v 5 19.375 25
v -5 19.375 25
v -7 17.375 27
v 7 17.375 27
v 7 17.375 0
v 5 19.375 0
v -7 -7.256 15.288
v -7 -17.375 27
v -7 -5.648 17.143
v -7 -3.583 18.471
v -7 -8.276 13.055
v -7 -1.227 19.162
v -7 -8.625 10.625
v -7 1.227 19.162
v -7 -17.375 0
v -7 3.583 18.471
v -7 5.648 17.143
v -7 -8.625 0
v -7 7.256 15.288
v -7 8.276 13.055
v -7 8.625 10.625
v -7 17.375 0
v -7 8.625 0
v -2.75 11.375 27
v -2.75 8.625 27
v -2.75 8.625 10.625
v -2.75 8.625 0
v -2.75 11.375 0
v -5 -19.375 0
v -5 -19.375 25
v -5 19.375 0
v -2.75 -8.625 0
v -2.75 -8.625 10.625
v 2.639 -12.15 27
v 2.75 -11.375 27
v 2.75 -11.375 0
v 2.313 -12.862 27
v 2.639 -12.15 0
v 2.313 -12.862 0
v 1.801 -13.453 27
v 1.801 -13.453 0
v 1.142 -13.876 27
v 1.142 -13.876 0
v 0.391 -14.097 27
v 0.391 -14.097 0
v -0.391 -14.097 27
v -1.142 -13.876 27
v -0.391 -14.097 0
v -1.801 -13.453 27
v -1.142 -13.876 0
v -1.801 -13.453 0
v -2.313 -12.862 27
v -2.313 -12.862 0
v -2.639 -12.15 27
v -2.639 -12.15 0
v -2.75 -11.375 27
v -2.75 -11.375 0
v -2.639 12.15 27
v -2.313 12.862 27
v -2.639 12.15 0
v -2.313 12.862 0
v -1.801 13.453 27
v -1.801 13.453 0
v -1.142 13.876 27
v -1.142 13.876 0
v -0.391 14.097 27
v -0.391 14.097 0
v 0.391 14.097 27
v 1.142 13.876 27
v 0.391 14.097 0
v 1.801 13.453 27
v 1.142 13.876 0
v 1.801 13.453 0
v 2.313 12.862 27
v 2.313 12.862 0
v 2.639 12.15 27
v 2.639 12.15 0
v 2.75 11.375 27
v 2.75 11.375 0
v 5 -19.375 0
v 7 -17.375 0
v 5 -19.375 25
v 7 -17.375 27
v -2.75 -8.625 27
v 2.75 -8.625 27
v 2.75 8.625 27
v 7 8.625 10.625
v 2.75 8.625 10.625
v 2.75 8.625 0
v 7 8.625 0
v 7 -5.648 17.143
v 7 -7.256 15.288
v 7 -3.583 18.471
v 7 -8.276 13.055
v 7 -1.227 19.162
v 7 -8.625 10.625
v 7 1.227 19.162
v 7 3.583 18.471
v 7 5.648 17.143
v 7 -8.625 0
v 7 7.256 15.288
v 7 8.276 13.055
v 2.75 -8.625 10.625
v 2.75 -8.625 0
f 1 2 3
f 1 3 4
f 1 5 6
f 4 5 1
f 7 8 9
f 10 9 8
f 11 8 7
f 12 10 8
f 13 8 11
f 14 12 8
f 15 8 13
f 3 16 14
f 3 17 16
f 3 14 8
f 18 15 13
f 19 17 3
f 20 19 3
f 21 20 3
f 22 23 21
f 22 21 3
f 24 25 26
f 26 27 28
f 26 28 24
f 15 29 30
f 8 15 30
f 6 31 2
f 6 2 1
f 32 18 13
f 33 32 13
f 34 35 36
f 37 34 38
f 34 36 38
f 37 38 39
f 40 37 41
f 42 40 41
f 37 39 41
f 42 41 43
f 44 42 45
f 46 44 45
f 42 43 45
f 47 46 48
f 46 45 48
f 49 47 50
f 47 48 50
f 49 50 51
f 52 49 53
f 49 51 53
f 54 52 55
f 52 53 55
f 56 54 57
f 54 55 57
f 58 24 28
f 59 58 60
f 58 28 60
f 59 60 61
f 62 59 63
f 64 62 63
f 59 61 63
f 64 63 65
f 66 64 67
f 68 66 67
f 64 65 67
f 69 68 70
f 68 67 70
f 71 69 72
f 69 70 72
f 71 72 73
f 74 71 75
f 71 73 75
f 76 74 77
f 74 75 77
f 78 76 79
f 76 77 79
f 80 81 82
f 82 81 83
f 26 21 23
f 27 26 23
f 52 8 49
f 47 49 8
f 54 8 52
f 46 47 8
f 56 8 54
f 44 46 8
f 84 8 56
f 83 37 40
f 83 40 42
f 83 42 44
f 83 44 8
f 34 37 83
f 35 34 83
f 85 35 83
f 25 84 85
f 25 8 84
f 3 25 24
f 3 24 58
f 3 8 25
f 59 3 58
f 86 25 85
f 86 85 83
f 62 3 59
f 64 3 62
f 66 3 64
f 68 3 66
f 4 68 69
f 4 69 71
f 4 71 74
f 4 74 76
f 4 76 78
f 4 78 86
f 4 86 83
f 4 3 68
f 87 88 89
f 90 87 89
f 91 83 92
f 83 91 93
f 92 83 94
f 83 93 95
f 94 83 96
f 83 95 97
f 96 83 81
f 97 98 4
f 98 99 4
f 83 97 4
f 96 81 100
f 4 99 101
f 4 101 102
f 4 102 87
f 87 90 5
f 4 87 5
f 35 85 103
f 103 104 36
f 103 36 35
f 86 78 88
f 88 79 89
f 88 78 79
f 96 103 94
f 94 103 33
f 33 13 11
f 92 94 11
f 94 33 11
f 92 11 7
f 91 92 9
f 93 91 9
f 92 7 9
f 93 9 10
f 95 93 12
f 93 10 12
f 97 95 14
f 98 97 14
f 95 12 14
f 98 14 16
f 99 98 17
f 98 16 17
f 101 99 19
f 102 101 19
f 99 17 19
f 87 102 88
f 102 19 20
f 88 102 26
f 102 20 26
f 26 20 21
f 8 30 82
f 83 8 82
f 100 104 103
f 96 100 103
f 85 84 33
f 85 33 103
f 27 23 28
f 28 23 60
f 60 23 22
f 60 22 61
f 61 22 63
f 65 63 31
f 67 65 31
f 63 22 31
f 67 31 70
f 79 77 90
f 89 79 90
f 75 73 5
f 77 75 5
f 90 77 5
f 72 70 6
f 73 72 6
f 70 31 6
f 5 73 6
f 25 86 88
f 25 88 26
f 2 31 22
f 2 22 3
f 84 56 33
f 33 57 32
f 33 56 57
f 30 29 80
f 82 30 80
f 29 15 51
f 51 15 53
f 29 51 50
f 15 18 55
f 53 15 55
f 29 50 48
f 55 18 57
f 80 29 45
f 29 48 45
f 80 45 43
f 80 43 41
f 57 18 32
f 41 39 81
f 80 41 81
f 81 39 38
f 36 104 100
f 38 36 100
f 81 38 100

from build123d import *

# Parameters (mm, degrees)
SKETCH1_W           = 14
SKETCH1_H           = 38.75
BOSS_EXTRUDE1_DEPTH = 27
SKETCH2_R           = 8.625
CUT_EXTRUDE1_DEPTH  = 15
CHAMFER1_SIZE       = 2
CHAMFER2_SIZE       = 2


with BuildPart() as part:
    # Sketch1 → Boss-Extrude1 (new body)
    with BuildSketch(Plane.XY):
        Rectangle(SKETCH1_W, SKETCH1_H)
        with BuildLine():
            ThreePointArc((2.75, -11.375), (0, -14.125), (-2.75, -11.375))
            Line((-2.75, -11.375), (-2.75, -8.625))
            Line((-2.75, -8.625), (0, -8.625))
            Line((0, -8.625), (2.75, -8.625))
            Line((2.75, -8.625), (2.75, -11.375))
        make_face(mode=Mode.SUBTRACT)
        with BuildLine():
            Line((-2.75, 8.625), (-2.75, 11.375))
            ThreePointArc((-2.75, 11.375), (0, 14.125), (2.75, 11.375))
            Line((2.75, 11.375), (2.75, 8.625))
            Line((2.75, 8.625), (0, 8.625))
            Line((0, 8.625), (-2.75, 8.625))
        make_face(mode=Mode.SUBTRACT)
    extrude(amount=BOSS_EXTRUDE1_DEPTH)

    # Sketch2 → Cut-Extrude1 (cut, through all)
    with BuildSketch(Plane.ZY.offset(7)):
        with BuildLine():
            ThreePointArc((10.625, -8.625), (2, 0), (10.625, 8.625))
            Line((10.625, 8.625), (0, 8.625))
            Line((0, 8.625), (0, 0))
            Line((0, 0), (0, -8.625))
            Line((0, -8.625), (10.625, -8.625))
        make_face()
        with Locations((10.625, 0)):
            Circle(SKETCH2_R)
    extrude(amount=-CUT_EXTRUDE1_DEPTH, mode=Mode.SUBTRACT)

    # Chamfer1
    chamfer1_edges = [part.edges().sort_by_distance(p)[0] for p in [
        (7, -19.375, 13.5),
        (-7, -19.375, 13.5),
        (-7, 19.375, 13.5),
        (7, 19.375, 13.5),
    ]]
    chamfer(chamfer1_edges, length=CHAMFER1_SIZE)

    # Chamfer2
    chamfer2_edges = [part.edges().sort_by_distance(p)[0] for p in [
        (0, -19.375, 27),
        (0, 19.375, 27),
    ]]
    chamfer(chamfer2_edges, length=CHAMFER2_SIZE)


solid = part.part
